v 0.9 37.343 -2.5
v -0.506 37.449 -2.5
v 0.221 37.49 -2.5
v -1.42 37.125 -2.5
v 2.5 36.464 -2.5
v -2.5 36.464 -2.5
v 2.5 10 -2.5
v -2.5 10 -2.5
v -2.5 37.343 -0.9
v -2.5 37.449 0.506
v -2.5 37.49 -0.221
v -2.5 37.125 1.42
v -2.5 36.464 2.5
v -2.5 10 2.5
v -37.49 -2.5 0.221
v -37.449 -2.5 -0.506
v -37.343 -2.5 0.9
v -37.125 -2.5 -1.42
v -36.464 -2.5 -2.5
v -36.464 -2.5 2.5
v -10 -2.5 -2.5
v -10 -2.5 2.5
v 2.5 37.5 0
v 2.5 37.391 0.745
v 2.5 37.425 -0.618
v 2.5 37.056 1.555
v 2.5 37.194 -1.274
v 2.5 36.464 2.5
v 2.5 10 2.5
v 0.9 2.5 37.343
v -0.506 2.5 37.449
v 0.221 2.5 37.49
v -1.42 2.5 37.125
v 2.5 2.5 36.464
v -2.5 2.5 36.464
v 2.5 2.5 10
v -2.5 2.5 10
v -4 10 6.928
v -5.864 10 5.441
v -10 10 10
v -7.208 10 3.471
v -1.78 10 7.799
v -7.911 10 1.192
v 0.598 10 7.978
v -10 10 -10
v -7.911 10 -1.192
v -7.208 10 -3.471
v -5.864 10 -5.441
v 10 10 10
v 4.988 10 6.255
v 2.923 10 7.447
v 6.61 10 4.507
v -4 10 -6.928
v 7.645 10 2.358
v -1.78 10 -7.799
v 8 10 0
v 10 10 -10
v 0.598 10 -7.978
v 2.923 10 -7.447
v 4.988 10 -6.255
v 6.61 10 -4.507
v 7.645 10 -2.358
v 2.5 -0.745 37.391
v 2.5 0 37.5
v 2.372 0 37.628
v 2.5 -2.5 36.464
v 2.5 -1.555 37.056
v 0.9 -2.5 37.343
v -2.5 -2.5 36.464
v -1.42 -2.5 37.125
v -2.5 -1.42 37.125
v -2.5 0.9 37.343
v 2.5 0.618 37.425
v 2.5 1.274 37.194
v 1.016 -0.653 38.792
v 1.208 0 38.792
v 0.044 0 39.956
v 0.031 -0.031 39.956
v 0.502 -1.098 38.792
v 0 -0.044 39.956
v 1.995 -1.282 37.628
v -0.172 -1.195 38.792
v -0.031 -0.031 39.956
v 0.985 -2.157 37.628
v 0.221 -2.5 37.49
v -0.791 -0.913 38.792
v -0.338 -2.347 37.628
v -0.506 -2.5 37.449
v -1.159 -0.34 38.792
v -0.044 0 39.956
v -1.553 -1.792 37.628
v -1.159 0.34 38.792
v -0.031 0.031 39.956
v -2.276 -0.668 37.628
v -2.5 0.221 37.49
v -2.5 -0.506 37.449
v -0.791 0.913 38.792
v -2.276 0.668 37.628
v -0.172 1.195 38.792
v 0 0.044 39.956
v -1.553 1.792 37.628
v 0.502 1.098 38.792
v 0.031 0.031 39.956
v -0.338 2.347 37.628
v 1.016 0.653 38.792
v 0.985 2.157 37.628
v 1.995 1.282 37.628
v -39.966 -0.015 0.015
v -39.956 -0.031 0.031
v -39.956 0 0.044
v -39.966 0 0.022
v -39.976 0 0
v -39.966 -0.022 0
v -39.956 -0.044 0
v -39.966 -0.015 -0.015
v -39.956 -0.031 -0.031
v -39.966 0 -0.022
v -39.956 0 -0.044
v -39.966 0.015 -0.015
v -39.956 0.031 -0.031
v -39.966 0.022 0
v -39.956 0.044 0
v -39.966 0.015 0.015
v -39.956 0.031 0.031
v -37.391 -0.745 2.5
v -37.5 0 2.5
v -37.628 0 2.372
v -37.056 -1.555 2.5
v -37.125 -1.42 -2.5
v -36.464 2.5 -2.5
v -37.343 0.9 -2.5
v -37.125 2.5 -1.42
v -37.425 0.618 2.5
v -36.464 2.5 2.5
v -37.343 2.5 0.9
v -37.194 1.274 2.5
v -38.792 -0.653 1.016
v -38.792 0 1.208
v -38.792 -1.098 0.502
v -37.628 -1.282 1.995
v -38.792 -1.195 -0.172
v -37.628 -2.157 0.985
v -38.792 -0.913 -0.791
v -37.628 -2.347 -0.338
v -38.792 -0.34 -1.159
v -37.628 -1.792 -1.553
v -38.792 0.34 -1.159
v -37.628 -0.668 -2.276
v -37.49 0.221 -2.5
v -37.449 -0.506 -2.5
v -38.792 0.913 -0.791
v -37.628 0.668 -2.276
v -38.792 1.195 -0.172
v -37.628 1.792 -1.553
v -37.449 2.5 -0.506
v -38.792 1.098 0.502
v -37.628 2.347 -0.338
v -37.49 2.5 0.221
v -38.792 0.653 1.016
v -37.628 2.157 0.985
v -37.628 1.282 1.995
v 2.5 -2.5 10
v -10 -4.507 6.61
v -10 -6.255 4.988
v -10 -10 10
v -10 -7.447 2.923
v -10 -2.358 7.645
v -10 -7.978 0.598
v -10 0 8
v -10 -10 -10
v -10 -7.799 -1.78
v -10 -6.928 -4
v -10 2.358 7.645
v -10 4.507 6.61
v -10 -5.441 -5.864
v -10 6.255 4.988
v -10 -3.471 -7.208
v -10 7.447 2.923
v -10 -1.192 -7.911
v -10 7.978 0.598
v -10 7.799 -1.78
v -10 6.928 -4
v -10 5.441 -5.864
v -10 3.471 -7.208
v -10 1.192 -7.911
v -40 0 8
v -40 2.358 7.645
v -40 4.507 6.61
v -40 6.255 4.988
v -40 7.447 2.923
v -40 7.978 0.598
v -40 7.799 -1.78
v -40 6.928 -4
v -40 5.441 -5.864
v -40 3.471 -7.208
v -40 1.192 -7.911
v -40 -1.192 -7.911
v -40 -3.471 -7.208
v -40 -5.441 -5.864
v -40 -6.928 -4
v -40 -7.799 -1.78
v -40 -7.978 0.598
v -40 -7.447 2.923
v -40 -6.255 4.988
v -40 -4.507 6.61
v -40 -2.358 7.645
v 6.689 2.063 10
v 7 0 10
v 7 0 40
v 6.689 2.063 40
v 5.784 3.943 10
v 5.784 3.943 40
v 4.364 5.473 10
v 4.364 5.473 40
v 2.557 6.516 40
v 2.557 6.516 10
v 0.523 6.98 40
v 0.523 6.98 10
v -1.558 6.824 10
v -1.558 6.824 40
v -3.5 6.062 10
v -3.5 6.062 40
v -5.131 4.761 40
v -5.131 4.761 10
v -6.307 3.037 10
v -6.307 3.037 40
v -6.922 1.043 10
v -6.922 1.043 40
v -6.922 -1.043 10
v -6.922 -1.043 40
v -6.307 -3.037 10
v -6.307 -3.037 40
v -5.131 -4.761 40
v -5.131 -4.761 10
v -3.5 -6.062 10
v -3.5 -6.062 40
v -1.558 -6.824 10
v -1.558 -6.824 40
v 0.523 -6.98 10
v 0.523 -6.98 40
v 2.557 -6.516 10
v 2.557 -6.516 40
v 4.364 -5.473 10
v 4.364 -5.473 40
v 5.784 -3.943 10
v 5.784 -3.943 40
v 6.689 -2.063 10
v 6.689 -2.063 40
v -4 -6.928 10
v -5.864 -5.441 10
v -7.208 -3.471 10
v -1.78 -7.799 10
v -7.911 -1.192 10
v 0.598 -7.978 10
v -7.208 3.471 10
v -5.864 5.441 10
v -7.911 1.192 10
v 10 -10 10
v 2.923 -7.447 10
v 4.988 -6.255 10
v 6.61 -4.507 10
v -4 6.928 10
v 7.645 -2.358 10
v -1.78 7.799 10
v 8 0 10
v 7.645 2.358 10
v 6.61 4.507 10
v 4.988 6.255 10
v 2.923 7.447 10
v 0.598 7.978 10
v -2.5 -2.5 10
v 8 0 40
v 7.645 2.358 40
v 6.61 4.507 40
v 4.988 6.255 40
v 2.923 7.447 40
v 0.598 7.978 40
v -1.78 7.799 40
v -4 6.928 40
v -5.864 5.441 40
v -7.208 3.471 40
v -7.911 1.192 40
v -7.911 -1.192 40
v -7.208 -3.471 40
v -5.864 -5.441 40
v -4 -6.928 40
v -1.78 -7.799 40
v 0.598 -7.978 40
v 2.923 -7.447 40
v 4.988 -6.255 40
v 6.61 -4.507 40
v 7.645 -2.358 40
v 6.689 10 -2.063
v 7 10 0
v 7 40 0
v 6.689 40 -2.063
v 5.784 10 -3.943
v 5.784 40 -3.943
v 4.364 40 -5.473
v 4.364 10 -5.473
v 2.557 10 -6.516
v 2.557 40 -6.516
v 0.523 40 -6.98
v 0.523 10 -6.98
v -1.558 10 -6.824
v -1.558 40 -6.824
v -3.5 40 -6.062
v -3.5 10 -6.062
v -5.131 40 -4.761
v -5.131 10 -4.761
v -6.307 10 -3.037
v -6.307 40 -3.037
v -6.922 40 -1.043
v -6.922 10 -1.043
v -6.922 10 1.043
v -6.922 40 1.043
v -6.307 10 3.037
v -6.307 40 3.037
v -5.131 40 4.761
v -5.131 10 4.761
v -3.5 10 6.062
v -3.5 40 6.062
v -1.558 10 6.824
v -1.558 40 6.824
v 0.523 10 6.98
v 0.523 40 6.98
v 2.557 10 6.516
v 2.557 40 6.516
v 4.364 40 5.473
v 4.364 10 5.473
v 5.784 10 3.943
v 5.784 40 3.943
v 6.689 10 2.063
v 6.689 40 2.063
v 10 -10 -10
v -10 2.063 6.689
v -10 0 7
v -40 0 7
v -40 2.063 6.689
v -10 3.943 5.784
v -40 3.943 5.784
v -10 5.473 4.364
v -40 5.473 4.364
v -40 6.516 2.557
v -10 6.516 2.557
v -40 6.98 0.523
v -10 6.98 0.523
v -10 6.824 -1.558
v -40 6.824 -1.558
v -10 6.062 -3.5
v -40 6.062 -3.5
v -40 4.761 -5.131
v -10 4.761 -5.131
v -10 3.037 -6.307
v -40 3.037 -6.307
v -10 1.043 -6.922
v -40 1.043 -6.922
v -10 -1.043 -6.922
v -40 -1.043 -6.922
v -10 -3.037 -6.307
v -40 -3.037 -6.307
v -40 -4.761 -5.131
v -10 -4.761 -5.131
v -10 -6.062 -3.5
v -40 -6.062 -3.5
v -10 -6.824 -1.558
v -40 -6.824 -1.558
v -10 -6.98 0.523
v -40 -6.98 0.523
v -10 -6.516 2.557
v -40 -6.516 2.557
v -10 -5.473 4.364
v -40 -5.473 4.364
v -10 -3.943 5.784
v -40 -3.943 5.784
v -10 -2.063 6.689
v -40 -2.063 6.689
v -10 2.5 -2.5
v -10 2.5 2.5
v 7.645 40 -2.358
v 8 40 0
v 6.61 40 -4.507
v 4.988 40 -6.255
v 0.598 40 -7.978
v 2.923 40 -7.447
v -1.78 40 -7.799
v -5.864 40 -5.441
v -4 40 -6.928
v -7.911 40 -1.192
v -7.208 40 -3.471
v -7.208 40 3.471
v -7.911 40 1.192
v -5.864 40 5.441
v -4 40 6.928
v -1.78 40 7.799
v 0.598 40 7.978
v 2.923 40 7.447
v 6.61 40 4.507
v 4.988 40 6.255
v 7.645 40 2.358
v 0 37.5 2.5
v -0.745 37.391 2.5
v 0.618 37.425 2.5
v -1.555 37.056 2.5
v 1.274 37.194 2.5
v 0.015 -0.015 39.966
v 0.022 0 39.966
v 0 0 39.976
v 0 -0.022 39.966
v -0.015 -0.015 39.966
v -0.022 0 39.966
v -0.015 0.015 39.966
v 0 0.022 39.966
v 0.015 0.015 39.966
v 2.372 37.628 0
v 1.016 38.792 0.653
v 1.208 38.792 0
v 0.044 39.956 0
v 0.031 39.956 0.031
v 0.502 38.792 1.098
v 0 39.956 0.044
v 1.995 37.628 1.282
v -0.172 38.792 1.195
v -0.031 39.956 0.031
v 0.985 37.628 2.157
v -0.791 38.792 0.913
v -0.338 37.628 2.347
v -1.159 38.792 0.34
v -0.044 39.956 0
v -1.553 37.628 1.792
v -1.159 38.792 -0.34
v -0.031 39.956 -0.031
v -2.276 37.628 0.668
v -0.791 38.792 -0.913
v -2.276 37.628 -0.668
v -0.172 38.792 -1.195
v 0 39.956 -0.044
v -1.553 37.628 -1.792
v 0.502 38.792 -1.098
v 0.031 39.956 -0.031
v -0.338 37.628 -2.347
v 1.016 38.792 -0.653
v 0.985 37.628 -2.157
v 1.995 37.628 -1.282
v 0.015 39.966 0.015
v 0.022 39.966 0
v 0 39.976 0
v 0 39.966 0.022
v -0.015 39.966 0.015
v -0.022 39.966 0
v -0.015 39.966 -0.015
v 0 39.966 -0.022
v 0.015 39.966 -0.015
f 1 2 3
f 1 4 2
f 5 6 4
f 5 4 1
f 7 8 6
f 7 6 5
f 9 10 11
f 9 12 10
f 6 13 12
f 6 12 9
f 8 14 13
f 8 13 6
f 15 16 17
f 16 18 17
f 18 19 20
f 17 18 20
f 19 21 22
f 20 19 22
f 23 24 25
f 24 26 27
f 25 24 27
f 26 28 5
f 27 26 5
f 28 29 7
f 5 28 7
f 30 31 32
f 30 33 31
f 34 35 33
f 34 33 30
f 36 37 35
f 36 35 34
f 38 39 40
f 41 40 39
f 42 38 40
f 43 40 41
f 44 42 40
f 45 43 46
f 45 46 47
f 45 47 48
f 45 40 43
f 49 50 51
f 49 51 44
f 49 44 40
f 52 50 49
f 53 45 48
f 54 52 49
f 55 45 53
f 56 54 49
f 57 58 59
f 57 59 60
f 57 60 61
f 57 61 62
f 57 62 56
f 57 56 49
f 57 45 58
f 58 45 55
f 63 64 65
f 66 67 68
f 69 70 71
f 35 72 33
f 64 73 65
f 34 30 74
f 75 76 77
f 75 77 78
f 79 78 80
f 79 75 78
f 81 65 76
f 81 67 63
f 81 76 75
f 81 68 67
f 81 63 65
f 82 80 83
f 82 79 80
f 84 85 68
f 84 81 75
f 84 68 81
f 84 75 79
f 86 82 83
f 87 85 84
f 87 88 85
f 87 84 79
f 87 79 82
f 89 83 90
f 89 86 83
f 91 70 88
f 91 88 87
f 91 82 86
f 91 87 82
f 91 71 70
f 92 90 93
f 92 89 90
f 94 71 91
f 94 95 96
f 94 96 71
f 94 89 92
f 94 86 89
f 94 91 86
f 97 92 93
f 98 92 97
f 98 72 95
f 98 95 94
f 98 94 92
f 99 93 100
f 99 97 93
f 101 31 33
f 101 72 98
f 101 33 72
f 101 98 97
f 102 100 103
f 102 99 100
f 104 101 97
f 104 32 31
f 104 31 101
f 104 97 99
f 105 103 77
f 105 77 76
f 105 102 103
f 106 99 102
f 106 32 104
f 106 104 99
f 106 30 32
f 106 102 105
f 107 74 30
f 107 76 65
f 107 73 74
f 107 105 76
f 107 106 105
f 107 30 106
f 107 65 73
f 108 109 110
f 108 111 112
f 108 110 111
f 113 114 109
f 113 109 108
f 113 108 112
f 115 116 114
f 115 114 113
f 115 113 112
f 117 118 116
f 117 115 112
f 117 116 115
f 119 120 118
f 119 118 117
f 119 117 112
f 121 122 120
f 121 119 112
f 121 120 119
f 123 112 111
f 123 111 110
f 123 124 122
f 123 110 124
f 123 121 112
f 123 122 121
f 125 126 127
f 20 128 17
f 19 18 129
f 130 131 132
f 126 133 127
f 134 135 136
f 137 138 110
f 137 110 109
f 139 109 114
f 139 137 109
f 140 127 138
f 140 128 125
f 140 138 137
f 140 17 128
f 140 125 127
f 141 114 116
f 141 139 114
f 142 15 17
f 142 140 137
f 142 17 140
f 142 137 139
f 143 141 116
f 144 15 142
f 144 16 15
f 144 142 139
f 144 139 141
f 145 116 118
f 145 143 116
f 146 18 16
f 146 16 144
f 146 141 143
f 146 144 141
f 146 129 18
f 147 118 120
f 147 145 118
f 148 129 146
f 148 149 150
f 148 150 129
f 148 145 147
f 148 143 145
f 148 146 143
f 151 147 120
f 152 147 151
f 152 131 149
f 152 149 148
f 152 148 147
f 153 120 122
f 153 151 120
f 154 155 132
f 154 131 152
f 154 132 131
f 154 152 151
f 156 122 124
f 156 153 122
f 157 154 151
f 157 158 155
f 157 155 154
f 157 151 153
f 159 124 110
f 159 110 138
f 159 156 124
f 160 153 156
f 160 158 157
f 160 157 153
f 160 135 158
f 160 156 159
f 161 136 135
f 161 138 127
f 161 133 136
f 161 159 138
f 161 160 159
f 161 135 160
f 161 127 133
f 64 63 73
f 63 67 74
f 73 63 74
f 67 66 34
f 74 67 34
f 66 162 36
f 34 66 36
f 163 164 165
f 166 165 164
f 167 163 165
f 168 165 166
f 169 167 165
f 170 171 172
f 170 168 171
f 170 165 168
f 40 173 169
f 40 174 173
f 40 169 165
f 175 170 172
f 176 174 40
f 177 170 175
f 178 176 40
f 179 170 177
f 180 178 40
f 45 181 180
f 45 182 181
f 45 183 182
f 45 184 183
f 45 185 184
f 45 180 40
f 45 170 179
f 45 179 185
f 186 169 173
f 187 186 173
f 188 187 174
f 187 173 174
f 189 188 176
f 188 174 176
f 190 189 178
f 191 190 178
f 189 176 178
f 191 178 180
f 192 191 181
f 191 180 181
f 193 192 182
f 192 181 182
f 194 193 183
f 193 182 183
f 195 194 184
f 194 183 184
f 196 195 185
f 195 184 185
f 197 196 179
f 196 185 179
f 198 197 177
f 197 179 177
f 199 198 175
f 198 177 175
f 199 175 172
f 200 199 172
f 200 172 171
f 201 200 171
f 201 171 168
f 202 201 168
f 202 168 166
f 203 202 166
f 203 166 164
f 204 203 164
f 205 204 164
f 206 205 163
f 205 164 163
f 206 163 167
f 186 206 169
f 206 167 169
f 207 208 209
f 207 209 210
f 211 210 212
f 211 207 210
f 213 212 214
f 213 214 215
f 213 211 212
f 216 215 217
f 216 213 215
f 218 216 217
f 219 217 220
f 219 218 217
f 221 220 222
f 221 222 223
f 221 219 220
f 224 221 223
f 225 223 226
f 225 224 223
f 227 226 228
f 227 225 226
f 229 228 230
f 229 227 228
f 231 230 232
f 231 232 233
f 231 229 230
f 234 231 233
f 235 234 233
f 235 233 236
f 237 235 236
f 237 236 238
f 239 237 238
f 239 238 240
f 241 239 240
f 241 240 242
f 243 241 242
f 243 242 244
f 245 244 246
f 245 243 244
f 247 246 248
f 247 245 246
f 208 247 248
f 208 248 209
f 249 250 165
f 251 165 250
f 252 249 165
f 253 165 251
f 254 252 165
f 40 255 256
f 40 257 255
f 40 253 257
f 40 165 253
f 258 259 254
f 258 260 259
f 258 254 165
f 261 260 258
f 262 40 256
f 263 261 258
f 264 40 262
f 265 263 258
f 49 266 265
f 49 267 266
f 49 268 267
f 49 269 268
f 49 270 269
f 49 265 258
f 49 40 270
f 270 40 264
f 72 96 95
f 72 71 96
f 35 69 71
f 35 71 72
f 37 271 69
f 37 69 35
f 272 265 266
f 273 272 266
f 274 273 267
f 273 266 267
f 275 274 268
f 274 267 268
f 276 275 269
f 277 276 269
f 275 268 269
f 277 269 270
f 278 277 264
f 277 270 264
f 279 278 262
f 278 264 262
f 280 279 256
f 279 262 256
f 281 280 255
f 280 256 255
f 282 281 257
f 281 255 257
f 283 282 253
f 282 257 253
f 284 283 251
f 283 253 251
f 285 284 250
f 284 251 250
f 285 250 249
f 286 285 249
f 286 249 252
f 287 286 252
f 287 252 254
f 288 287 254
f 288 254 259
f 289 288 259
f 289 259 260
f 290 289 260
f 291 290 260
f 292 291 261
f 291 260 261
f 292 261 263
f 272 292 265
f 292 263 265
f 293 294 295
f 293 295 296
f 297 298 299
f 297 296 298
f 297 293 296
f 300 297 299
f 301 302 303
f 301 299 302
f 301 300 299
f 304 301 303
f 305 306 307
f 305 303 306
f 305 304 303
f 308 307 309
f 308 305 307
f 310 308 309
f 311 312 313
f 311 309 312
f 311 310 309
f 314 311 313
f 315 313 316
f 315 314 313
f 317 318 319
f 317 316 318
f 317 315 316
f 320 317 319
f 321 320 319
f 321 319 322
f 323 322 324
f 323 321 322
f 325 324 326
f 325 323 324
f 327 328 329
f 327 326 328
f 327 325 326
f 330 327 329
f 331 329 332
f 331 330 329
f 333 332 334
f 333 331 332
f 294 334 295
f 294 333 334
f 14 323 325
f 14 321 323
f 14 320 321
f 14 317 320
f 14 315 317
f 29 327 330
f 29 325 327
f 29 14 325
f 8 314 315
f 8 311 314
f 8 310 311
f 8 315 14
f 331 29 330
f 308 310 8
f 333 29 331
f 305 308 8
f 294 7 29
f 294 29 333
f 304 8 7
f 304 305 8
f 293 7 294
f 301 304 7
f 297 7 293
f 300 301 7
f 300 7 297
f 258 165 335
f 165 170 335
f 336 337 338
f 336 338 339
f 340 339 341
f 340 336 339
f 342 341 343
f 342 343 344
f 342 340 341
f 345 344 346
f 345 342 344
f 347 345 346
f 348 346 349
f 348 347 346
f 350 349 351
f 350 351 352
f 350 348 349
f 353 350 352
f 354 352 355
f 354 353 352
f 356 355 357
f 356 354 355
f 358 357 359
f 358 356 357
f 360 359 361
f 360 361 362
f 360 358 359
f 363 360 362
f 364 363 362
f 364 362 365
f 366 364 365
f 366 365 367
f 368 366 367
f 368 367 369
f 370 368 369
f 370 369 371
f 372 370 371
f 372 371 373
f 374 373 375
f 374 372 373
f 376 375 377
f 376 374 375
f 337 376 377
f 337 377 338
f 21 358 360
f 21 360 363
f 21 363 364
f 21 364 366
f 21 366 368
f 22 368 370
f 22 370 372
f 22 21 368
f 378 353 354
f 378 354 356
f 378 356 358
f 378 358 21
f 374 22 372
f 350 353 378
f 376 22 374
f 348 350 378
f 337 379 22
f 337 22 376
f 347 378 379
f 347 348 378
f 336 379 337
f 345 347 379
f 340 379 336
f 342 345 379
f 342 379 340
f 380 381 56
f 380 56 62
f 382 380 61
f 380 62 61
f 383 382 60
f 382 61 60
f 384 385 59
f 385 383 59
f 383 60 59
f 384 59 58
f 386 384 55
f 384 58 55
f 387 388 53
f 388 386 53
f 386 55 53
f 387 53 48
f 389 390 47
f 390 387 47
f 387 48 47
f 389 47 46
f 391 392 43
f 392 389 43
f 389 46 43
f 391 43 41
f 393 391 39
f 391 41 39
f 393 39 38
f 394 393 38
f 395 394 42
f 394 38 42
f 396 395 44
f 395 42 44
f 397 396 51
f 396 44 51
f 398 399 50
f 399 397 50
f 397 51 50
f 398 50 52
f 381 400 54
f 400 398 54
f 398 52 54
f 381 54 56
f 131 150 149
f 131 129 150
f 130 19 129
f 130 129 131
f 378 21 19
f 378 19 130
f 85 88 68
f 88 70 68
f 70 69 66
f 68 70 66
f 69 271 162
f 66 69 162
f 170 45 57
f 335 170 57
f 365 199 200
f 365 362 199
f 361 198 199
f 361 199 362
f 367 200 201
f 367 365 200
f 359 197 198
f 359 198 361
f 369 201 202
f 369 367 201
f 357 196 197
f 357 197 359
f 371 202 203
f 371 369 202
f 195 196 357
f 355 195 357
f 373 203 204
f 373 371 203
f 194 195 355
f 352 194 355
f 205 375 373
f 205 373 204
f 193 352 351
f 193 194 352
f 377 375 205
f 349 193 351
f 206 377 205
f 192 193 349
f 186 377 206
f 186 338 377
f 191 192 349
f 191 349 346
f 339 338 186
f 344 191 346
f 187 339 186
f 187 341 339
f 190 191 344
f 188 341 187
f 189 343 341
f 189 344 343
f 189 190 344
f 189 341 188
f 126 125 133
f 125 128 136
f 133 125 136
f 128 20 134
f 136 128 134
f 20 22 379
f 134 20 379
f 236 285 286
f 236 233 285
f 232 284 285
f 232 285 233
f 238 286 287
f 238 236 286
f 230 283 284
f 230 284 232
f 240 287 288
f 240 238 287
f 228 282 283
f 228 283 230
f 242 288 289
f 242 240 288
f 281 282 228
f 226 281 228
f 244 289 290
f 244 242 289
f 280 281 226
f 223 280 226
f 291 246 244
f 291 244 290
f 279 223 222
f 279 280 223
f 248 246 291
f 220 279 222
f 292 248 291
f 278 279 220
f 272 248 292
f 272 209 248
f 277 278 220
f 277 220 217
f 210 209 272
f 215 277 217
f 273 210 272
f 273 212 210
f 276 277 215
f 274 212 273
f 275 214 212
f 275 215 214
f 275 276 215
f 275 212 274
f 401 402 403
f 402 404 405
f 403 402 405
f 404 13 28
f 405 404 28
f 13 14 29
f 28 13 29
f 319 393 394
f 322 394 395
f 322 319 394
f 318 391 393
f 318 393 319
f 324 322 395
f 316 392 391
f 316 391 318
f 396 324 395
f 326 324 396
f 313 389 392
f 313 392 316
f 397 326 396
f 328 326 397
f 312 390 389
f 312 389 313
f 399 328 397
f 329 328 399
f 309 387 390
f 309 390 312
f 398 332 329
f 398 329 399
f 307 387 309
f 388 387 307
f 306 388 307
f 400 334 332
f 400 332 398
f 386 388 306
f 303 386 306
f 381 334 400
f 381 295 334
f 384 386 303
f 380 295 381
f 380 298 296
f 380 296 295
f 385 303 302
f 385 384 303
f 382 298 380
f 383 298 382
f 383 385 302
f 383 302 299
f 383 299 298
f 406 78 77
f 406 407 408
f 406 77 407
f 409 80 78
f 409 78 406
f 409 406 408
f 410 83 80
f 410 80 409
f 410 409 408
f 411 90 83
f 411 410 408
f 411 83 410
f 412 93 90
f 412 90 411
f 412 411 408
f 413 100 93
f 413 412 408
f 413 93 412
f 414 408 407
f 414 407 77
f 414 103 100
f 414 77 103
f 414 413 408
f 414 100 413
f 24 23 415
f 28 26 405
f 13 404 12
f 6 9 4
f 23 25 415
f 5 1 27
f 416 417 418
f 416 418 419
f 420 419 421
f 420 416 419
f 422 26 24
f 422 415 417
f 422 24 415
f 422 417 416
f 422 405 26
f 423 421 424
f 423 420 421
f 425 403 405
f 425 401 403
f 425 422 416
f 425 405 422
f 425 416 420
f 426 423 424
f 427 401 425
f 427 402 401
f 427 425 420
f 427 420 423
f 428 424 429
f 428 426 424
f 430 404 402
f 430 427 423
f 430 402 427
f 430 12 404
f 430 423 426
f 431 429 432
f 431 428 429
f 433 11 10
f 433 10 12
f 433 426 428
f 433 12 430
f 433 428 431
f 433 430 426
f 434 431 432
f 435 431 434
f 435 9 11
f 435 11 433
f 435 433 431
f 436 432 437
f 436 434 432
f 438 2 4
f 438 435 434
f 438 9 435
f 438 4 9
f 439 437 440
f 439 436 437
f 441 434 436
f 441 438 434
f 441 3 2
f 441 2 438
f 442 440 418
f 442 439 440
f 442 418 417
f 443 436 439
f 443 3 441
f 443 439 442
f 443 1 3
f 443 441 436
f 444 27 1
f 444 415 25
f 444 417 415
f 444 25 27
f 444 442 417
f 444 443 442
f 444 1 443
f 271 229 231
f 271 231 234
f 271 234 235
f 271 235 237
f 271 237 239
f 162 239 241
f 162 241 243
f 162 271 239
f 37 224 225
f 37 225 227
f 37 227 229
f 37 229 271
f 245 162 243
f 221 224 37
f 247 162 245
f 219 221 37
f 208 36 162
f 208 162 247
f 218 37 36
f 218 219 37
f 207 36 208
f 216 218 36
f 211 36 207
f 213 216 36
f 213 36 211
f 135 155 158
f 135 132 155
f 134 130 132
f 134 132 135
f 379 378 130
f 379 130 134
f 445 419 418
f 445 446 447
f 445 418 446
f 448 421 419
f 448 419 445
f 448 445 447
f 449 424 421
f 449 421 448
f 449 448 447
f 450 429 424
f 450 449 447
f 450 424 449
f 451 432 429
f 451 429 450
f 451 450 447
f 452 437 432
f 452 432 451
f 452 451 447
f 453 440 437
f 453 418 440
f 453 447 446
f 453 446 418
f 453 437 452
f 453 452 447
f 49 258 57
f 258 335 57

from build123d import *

# Parameters (mm, degrees)
F0_W          = 20
F0_H          = 20
F1_DEPTH      = 10
F1_DEPTH_BACK = 10
F2_R          = 8
F2_R_2        = 7
F3_DEPTH      = 30
F4_W          = 5
F4_H          = 5
F5_DEPTH      = 30
F9_COUNT      = 2
F9_ANGLE      = 90
F10_COUNT     = 2
F10_ANGLE     = 90


with BuildPart() as f1:
    # F0 (on Top) → F1 (new body, two sides)
    with BuildSketch(Plane.XY) as f1_sk:
        Rectangle(F0_W, F0_H)
    extrude(amount=-F1_DEPTH)
    extrude(f1_sk.sketch, amount=F1_DEPTH_BACK)

    # F2 (on face) → F3 (join)
    with BuildSketch(Plane.XY.offset(10)):
        Circle(F2_R)
        Circle(F2_R_2, mode=Mode.SUBTRACT)
    extrude(amount=F3_DEPTH)

    # F4 (on face) → F5 (join)
    with BuildSketch(Plane.XY.offset(10)):
        Rectangle(F4_W, F4_H)
    extrude(amount=F5_DEPTH)

    # F6 (on Front) → F7 (revolve, cut)
    with BuildSketch(Plane.XZ):
        Polygon((0, 39.9759672582), (0.0436493601, 39.9563506399), (6.35, 33.65), (6.35, 40), (0, 40), align=None)
    revolve(axis=Axis((0, 0, 38.1132610887), (0, 0, -1)), mode=Mode.SUBTRACT)

    # F9: F1 ×2 about axis
    f9_axis = Axis((7.9106530175, 0, 0), (-1, 0, 0))


with BuildPart() as f1_1:
    add(f1.part)
    for i in range(1, F9_COUNT):
        add(f1.part.rotate(f9_axis, i * F9_ANGLE / (F9_COUNT - 1)))

    # F10: F1 ×2 about axis
    f10_axis = Axis((0, 10, 0), (0, -1, 0))


with BuildPart() as f1_2:
    add(f1_1.part)
    for i in range(1, F10_COUNT):
        add(f1_1.part.rotate(f10_axis, i * F10_ANGLE / (F10_COUNT - 1)))


solid = f1_2.part
